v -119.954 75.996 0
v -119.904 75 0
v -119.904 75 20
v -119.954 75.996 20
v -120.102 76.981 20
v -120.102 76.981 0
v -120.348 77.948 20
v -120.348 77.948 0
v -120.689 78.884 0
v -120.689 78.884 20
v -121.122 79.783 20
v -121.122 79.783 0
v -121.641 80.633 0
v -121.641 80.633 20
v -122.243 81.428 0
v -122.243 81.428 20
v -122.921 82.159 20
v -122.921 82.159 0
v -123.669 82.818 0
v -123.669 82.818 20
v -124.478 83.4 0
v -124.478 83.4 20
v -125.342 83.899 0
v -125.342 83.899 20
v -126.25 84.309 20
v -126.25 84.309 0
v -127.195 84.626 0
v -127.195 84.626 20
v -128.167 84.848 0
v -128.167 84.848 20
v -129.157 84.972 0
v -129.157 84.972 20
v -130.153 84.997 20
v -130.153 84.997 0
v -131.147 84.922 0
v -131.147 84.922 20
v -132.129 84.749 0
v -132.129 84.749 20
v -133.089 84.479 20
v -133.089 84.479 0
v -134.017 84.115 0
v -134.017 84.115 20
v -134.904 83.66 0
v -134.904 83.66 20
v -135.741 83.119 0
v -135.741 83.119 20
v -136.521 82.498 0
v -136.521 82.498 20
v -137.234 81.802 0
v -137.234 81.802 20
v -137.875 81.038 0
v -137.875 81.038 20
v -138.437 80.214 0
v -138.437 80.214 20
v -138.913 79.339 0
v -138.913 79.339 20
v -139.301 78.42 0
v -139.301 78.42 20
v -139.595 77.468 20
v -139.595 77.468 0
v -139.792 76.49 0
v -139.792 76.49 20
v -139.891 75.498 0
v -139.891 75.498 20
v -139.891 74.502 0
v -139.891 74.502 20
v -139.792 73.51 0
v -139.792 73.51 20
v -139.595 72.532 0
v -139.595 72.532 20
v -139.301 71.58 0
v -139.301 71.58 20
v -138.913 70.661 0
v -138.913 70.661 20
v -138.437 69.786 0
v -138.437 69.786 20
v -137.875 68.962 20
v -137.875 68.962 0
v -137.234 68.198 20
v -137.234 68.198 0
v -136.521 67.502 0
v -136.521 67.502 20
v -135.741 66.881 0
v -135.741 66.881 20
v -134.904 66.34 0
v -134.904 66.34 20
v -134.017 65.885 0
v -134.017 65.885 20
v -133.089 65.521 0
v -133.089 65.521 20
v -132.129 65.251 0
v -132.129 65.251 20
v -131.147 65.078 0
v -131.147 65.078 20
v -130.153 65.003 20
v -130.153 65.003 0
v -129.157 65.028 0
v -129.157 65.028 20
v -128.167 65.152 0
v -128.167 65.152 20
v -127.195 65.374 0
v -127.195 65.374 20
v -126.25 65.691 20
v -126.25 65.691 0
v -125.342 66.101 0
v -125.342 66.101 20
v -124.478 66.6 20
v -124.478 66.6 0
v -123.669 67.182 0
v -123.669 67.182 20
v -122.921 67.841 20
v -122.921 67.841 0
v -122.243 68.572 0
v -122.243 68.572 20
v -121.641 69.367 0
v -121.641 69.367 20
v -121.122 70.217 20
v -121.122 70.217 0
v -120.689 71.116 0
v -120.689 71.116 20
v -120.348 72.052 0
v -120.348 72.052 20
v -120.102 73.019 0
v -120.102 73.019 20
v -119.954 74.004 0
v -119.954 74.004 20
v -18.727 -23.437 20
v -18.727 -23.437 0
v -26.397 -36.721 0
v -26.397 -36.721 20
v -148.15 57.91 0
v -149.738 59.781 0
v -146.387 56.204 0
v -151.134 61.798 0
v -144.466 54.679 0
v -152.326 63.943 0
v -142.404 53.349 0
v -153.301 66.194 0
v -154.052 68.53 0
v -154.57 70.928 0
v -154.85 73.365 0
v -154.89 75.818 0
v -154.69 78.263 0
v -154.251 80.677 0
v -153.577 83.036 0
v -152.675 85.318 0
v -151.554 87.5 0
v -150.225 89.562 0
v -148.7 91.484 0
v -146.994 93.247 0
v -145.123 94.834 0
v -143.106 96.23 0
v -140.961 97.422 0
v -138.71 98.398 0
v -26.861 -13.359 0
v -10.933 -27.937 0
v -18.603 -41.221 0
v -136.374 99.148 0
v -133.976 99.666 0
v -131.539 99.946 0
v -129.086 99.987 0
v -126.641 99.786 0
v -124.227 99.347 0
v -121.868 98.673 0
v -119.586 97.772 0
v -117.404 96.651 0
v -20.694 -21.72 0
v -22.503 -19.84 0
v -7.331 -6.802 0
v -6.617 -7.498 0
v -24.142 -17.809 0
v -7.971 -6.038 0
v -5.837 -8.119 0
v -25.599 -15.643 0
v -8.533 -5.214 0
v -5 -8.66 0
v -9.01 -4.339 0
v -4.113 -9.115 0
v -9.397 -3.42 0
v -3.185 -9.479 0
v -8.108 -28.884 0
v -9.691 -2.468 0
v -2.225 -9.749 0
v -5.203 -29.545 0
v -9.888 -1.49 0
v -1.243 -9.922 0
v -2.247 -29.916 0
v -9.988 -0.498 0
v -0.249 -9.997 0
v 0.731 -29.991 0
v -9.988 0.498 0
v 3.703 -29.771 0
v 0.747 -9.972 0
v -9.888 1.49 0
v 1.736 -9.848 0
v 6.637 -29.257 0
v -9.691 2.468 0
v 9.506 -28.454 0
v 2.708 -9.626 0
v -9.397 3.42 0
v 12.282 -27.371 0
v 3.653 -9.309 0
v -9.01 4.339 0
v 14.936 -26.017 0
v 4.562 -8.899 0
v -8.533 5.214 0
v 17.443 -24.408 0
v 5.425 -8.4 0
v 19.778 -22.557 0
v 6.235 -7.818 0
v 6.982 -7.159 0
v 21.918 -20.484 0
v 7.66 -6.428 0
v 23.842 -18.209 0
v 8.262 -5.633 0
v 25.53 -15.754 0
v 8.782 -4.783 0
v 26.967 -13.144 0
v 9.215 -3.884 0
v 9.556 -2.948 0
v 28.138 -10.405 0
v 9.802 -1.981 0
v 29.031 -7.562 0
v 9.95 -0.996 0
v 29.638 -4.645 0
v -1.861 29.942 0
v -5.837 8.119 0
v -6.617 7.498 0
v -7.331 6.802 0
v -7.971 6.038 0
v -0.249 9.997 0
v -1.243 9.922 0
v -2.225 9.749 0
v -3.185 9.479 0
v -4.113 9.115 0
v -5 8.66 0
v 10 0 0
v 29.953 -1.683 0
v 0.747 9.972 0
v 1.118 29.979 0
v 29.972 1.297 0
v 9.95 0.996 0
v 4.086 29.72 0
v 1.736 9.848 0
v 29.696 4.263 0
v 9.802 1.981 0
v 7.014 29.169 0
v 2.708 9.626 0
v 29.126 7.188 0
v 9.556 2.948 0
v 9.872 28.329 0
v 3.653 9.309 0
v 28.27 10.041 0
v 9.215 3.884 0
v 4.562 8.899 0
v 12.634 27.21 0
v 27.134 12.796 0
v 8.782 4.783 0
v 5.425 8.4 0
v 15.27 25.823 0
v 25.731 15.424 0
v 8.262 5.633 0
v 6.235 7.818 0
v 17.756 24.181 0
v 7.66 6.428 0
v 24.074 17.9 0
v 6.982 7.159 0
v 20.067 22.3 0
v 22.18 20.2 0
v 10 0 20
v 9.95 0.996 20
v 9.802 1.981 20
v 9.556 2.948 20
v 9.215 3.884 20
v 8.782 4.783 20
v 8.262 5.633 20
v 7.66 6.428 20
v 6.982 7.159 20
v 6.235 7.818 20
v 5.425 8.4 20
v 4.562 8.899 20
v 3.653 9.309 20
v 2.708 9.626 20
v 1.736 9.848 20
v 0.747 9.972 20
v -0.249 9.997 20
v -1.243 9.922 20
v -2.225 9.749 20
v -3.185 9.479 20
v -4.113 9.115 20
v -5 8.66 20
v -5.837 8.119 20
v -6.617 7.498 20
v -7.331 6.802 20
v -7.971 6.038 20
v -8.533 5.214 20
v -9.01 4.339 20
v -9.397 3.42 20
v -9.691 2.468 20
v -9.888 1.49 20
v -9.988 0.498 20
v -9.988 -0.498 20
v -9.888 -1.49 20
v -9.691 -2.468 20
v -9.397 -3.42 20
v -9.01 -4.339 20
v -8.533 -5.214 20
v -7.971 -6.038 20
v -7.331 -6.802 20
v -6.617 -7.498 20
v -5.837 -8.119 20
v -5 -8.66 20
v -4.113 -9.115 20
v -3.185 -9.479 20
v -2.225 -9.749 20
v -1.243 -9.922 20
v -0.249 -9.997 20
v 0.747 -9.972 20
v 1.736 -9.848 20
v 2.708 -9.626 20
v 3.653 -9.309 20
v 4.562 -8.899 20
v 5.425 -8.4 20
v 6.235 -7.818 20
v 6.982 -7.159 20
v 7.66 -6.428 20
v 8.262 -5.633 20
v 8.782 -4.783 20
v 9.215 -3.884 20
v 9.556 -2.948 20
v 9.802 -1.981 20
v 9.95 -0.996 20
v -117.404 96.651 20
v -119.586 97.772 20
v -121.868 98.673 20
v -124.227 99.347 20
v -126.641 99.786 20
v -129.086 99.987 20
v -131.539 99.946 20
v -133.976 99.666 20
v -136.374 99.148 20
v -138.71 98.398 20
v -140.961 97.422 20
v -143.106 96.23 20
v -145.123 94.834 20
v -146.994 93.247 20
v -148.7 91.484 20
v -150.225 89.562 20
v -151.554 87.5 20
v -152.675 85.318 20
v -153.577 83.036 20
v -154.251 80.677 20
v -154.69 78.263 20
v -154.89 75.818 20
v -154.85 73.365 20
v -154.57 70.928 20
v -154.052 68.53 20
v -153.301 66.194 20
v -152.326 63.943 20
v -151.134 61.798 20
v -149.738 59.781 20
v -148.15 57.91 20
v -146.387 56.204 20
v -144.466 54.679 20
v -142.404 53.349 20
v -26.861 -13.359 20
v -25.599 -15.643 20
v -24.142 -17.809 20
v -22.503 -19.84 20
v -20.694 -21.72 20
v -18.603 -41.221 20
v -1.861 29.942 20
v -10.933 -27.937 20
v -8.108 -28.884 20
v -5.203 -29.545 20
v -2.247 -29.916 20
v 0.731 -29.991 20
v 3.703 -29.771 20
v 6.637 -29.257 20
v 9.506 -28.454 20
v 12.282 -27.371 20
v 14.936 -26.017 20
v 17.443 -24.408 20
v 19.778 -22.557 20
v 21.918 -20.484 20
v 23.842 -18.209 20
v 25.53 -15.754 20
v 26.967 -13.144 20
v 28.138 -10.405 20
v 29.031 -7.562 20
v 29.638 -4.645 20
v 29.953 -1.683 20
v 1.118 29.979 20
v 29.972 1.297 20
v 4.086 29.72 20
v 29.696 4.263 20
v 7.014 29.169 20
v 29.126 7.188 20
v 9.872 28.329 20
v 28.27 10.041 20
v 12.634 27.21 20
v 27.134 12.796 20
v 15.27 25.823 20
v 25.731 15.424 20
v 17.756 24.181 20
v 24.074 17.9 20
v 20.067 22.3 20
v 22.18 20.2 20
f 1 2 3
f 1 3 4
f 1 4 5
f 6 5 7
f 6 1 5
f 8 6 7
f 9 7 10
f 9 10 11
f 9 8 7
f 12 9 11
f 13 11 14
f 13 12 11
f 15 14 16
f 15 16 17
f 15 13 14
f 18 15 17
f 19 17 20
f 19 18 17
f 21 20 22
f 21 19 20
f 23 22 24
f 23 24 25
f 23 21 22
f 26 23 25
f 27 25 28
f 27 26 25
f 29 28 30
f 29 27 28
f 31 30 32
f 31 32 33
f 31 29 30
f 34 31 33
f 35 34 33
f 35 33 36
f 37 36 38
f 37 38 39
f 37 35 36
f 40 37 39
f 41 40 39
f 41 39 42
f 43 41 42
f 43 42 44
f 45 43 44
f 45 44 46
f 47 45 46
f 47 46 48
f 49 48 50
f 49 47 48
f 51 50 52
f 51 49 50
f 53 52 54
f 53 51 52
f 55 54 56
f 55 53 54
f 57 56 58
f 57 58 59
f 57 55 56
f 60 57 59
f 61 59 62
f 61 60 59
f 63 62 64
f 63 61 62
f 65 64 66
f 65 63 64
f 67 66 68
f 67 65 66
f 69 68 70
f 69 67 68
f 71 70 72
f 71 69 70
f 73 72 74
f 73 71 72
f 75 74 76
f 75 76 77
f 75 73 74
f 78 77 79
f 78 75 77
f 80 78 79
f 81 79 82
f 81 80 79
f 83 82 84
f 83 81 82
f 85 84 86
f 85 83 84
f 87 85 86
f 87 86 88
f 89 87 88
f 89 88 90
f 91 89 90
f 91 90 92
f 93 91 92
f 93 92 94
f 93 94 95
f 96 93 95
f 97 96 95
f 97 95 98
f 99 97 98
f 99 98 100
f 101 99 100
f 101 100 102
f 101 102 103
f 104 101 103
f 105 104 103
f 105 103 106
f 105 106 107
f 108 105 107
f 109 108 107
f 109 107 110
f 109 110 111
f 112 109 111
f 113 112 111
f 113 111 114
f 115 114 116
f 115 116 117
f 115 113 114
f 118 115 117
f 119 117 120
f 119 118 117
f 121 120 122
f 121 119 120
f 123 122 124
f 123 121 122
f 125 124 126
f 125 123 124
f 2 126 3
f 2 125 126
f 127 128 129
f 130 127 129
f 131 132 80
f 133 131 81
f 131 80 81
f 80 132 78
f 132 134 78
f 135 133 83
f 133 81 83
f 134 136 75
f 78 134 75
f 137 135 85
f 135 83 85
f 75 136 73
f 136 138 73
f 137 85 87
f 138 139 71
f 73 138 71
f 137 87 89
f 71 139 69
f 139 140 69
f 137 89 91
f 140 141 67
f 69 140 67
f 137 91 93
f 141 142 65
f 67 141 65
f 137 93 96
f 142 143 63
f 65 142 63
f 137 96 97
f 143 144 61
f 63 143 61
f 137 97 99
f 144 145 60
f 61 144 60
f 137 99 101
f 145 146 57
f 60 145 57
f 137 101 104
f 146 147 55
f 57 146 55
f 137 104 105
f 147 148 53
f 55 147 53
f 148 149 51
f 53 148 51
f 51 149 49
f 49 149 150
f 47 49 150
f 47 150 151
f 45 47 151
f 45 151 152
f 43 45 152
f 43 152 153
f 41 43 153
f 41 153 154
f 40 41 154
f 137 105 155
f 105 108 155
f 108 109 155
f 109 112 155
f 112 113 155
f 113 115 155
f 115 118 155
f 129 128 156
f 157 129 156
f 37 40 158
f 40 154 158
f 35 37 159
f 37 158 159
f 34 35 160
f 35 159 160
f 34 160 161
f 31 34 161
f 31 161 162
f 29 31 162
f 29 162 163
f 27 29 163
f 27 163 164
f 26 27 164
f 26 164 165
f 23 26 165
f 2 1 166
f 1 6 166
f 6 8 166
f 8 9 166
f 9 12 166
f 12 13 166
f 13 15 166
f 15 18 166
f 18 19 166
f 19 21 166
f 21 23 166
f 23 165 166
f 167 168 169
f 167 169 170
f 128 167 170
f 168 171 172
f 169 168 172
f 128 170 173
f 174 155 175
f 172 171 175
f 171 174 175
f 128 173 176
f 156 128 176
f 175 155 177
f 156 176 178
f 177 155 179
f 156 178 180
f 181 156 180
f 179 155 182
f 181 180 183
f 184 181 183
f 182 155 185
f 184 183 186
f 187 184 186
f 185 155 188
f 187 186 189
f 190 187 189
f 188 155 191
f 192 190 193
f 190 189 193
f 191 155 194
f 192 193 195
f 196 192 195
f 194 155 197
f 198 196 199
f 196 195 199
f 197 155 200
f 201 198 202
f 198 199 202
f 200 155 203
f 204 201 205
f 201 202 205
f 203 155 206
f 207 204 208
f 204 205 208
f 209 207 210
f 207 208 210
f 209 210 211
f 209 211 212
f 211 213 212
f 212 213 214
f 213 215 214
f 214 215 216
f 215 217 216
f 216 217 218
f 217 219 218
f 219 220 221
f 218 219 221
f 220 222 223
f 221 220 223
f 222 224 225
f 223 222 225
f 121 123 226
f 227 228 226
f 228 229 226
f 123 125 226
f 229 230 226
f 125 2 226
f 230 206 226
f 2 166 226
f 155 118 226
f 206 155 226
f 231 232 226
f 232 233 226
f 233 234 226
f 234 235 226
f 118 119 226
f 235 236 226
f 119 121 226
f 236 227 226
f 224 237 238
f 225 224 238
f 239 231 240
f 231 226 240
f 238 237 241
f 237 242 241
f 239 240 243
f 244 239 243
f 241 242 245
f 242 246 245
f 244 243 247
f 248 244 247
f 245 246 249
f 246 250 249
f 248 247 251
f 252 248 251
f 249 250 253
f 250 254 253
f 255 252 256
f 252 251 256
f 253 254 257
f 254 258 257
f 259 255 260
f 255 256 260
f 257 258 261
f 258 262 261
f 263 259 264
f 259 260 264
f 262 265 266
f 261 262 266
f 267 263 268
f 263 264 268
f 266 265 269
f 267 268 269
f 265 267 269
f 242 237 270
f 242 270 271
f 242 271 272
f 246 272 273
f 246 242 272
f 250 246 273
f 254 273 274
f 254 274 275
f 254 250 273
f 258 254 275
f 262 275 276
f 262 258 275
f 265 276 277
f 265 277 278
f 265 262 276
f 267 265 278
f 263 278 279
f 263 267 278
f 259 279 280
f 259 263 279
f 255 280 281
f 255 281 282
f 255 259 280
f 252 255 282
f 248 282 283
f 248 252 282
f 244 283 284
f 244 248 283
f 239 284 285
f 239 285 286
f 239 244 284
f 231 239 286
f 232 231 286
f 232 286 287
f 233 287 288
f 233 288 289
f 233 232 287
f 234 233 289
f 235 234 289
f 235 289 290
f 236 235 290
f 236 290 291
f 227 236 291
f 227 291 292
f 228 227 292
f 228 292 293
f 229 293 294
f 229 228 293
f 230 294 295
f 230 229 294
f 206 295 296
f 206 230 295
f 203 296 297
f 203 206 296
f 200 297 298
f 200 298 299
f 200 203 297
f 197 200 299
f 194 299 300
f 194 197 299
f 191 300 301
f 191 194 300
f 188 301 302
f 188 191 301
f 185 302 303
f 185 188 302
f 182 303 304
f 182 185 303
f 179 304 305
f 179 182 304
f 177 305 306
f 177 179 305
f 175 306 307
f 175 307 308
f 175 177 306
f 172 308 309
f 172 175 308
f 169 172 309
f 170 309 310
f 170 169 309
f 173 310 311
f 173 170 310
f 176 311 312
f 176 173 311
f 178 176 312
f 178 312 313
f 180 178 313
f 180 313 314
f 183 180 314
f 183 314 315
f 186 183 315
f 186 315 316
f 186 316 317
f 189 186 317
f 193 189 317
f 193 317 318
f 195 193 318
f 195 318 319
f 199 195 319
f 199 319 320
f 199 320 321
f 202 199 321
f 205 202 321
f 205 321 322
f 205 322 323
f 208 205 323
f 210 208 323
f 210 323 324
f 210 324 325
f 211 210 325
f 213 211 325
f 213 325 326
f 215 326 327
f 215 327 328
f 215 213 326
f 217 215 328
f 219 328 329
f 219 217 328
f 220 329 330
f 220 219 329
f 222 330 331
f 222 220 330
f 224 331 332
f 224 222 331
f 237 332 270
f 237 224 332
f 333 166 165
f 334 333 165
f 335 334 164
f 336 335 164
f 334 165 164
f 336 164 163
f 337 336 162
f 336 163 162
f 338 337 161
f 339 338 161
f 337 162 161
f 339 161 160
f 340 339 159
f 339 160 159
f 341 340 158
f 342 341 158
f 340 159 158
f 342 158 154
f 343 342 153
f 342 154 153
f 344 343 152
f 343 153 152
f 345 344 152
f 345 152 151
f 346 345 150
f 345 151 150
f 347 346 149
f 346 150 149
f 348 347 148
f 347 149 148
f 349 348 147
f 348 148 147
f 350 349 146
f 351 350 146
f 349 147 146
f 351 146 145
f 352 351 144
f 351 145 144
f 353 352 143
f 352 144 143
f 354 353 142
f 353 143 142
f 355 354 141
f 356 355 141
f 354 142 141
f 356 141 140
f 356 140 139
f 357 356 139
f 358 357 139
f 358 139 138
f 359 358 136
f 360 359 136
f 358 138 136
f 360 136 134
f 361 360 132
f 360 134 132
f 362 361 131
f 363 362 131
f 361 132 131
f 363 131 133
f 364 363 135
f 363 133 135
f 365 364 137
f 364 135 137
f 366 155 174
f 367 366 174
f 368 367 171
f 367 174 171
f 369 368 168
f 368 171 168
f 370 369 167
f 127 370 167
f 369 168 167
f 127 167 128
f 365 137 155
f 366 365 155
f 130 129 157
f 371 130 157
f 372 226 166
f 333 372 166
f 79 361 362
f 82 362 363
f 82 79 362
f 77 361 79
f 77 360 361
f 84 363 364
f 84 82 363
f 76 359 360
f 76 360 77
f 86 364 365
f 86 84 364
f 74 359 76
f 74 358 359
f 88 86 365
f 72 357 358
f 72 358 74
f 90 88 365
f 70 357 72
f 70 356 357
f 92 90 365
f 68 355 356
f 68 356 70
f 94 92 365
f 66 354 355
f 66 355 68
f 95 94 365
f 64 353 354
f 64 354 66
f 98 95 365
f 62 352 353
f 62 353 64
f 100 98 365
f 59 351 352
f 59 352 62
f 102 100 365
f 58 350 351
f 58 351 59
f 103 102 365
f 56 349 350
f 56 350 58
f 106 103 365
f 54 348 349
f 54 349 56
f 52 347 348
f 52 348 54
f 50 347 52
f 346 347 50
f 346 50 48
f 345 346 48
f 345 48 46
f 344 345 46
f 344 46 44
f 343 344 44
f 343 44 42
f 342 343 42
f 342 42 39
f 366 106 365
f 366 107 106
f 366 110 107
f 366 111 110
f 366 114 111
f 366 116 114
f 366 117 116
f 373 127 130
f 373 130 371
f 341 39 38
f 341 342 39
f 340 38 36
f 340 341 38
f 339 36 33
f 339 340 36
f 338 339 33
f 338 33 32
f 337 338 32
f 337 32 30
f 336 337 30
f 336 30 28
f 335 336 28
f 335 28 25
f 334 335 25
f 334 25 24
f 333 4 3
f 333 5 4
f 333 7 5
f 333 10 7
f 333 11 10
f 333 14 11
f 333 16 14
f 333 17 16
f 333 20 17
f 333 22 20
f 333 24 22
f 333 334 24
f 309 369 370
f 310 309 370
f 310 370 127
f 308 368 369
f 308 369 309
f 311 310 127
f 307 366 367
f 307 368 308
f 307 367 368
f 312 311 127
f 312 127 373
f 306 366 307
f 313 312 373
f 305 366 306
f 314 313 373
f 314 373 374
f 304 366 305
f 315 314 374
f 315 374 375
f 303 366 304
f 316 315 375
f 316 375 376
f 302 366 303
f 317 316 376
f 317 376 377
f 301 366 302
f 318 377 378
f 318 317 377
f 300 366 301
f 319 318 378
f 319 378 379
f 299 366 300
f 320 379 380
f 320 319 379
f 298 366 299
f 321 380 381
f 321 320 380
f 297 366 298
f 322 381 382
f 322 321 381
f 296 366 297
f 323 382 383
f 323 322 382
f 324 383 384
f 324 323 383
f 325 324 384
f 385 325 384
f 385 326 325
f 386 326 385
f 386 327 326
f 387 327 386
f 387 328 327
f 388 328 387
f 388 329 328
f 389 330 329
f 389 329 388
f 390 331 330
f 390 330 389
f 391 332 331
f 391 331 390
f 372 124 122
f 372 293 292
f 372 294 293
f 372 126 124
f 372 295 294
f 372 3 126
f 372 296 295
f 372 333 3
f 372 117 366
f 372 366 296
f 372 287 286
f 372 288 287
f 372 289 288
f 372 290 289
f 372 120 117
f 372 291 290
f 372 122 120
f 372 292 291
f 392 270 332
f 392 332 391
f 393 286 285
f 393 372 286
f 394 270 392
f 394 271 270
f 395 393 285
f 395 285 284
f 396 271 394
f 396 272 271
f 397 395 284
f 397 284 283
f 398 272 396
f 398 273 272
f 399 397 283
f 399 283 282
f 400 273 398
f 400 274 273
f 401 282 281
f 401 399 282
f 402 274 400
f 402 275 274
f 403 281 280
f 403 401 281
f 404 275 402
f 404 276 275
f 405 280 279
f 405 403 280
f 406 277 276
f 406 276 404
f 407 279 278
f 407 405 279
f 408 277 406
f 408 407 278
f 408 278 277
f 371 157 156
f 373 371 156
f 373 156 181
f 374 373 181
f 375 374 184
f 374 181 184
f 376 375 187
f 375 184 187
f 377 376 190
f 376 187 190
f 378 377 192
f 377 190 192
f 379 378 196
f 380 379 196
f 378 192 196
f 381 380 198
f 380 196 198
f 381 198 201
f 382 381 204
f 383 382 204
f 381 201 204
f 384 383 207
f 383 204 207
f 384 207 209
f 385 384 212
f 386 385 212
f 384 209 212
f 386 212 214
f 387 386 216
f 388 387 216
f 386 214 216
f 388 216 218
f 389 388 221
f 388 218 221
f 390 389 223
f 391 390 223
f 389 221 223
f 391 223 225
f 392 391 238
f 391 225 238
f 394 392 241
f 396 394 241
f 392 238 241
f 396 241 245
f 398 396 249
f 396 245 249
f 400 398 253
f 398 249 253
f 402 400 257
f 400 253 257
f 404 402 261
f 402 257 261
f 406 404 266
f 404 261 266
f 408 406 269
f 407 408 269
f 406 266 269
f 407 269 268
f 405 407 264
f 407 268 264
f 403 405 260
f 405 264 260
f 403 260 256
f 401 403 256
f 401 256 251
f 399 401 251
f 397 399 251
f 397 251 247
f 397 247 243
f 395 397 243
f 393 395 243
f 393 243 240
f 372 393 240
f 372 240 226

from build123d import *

# Parameters (mm, degrees)
ESQUISSE1_R        = 10
BOSS_EXTRU_1_DEPTH = 20


with BuildPart() as part:
    # Esquisse1 → Boss.-Extru.1 (new body)
    with BuildSketch(Plane.XY):
        with BuildLine():
            Line((-1.861405692, 29.942197128), (-117.403809643, 96.650635152))
            ThreePointArc((-117.403809643, 96.650635152), (-151.55444502, 87.500001112), (-142.40381098, 53.349365735))
            Line((-142.40381098, 53.349365735), (-26.861407029, -13.359072289))
            ThreePointArc((-26.861407029, -13.359072289), (-23.344702971, -18.842102939), (-18.727404267, -23.436815684))
            Line((-18.727404267, -23.436815684), (-26.397114317, -36.72114317))
            Line((-26.397114317, -36.72114317), (-18.602885683, -41.22114317))
            Line((-18.602885683, -41.22114317), (-10.933175633, -27.936815684))
            ThreePointArc((-10.933175633, -27.936815684), (29.638157143, -4.645389236), (-1.861405692, 29.942197128))
        make_face()
        with Locations((-129.903810312, 75.000000443)):
            Circle(ESQUISSE1_R, mode=Mode.SUBTRACT)
        Circle(ESQUISSE1_R, mode=Mode.SUBTRACT)
    extrude(amount=BOSS_EXTRU_1_DEPTH)


solid = part.part
